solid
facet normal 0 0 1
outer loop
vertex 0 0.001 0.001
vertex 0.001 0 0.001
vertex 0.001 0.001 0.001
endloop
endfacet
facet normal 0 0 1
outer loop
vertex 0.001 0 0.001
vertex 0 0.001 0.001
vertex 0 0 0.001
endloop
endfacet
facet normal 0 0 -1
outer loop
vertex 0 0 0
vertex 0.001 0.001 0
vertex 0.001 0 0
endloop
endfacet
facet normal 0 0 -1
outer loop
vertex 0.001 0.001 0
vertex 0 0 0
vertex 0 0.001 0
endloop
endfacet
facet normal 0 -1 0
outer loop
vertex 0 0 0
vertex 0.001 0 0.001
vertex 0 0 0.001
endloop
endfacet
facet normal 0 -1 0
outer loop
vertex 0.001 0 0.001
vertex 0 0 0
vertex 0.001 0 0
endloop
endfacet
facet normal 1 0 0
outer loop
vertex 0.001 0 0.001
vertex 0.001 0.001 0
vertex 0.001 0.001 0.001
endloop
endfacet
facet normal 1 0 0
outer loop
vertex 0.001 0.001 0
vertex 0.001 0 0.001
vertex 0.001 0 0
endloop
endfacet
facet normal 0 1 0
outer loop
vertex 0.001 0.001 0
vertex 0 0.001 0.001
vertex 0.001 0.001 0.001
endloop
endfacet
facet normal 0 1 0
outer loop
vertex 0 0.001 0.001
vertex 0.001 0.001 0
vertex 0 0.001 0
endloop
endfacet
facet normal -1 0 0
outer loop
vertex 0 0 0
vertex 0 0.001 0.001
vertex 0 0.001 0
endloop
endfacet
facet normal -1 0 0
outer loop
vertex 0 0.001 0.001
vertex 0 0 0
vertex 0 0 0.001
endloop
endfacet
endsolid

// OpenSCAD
// t_resolution — the library across the resolutions a CONSUMER might set.
//
// Nothing under src/ sets $fa, $fs or $fn, so every one of them comes from the
// calling model. Every other gate pins exactly one resolution per example, so
// until this file existed the library's behaviour across resolutions had never
// been tested at all -- and a resolution-dependent hole through a junction sat
// there rendering `Simple: yes`.

use <../src/uniTube.scad>;

// A representative hollow tee, built fresh at each resolution because the
// profiles' point counts depend on it.
function tee() = ut_net(
    [
        ut_run("t", ut_polyline([ [ -50, 0, 0 ], [ 50, 0, 0 ] ]), ut_round(od = 20, wall = 2)),
        ut_run("b", ut_polyline([ [ 0, 10, 0 ], [ 0, 50, 0 ] ]), ut_round(od = 12, wall = 2)),
    ],
    [ut_joint([ [ "t", [ "s", 50 ] ], [ "b", "a" ] ])]);

// --- every analytic check holds across the whole usable range -----------------
for (n = [ 8, 12, 16, 24, 32, 48, 64, 96, 128 ])
{
    assert(ut_check_net(tee(), $fn = n), str("the network must validate at $fn=", n));
}
// And with $fa/$fs instead of $fn, which is the more common way to ask.
for (fa = [ 24, 12, 8, 6, 3, 1 ])
{
    assert(ut_check_net(tee(), $fa = fa, $fs = 0.5), str("the network must validate at $fa=", fa));
}

// --- the bore inradius converges to the nominal from BELOW, never above -------
// This is the property whose absence sized a subtracted sphere too large.
prof = ut_round(od = 20, id = 16, n = 8);
assert(ut_bore_inradius(prof) < 8, "a faceted bore holds a SMALLER sphere than its nominal radius");
assert(ut_bore_inradius(prof) > 0, "but a positive one");
for (n = [ 6, 12, 48 ])
{
    let(p2 = ut_round(od = 20, id = 16, n = n))
    {
        assert(ut_bore_inradius(p2) <= 8 + 1e-9, str("never above nominal, at n=", n));
        assert(ut_bore_inradius(p2) < ut_prof_reach(p2), str("and always inside the outer reach, at n=", n));
    }
}
// Finer sampling must get closer to nominal, never further.
assert(ut_bore_inradius(ut_round(od = 20, id = 16, n = 48)) > ut_bore_inradius(ut_round(od = 20, id = 16, n = 6)),
       "refining the profile must raise the inradius toward the nominal");

// --- the joint ball keeps a real wall across the range ------------------------
// Measured facet to facet. At $fn=5 on a thin-walled tee this goes NEGATIVE,
// which is a hole through the junction -- tests/guards/g_net4_facet_wall.scad.
for (n = [ 12, 24, 64 ])
{
    let(net = tee(), j = ut_net_joints(net)[0])
    {
        assert(ut_sphere_inradius(ut_joint_shell_r(net, j), $fn = n) - ut_joint_core_r(net, j) > 0,
               str("the joint ball must keep material between its facets at $fn=", n));
    }
}

cube(0.001); // sentinel
